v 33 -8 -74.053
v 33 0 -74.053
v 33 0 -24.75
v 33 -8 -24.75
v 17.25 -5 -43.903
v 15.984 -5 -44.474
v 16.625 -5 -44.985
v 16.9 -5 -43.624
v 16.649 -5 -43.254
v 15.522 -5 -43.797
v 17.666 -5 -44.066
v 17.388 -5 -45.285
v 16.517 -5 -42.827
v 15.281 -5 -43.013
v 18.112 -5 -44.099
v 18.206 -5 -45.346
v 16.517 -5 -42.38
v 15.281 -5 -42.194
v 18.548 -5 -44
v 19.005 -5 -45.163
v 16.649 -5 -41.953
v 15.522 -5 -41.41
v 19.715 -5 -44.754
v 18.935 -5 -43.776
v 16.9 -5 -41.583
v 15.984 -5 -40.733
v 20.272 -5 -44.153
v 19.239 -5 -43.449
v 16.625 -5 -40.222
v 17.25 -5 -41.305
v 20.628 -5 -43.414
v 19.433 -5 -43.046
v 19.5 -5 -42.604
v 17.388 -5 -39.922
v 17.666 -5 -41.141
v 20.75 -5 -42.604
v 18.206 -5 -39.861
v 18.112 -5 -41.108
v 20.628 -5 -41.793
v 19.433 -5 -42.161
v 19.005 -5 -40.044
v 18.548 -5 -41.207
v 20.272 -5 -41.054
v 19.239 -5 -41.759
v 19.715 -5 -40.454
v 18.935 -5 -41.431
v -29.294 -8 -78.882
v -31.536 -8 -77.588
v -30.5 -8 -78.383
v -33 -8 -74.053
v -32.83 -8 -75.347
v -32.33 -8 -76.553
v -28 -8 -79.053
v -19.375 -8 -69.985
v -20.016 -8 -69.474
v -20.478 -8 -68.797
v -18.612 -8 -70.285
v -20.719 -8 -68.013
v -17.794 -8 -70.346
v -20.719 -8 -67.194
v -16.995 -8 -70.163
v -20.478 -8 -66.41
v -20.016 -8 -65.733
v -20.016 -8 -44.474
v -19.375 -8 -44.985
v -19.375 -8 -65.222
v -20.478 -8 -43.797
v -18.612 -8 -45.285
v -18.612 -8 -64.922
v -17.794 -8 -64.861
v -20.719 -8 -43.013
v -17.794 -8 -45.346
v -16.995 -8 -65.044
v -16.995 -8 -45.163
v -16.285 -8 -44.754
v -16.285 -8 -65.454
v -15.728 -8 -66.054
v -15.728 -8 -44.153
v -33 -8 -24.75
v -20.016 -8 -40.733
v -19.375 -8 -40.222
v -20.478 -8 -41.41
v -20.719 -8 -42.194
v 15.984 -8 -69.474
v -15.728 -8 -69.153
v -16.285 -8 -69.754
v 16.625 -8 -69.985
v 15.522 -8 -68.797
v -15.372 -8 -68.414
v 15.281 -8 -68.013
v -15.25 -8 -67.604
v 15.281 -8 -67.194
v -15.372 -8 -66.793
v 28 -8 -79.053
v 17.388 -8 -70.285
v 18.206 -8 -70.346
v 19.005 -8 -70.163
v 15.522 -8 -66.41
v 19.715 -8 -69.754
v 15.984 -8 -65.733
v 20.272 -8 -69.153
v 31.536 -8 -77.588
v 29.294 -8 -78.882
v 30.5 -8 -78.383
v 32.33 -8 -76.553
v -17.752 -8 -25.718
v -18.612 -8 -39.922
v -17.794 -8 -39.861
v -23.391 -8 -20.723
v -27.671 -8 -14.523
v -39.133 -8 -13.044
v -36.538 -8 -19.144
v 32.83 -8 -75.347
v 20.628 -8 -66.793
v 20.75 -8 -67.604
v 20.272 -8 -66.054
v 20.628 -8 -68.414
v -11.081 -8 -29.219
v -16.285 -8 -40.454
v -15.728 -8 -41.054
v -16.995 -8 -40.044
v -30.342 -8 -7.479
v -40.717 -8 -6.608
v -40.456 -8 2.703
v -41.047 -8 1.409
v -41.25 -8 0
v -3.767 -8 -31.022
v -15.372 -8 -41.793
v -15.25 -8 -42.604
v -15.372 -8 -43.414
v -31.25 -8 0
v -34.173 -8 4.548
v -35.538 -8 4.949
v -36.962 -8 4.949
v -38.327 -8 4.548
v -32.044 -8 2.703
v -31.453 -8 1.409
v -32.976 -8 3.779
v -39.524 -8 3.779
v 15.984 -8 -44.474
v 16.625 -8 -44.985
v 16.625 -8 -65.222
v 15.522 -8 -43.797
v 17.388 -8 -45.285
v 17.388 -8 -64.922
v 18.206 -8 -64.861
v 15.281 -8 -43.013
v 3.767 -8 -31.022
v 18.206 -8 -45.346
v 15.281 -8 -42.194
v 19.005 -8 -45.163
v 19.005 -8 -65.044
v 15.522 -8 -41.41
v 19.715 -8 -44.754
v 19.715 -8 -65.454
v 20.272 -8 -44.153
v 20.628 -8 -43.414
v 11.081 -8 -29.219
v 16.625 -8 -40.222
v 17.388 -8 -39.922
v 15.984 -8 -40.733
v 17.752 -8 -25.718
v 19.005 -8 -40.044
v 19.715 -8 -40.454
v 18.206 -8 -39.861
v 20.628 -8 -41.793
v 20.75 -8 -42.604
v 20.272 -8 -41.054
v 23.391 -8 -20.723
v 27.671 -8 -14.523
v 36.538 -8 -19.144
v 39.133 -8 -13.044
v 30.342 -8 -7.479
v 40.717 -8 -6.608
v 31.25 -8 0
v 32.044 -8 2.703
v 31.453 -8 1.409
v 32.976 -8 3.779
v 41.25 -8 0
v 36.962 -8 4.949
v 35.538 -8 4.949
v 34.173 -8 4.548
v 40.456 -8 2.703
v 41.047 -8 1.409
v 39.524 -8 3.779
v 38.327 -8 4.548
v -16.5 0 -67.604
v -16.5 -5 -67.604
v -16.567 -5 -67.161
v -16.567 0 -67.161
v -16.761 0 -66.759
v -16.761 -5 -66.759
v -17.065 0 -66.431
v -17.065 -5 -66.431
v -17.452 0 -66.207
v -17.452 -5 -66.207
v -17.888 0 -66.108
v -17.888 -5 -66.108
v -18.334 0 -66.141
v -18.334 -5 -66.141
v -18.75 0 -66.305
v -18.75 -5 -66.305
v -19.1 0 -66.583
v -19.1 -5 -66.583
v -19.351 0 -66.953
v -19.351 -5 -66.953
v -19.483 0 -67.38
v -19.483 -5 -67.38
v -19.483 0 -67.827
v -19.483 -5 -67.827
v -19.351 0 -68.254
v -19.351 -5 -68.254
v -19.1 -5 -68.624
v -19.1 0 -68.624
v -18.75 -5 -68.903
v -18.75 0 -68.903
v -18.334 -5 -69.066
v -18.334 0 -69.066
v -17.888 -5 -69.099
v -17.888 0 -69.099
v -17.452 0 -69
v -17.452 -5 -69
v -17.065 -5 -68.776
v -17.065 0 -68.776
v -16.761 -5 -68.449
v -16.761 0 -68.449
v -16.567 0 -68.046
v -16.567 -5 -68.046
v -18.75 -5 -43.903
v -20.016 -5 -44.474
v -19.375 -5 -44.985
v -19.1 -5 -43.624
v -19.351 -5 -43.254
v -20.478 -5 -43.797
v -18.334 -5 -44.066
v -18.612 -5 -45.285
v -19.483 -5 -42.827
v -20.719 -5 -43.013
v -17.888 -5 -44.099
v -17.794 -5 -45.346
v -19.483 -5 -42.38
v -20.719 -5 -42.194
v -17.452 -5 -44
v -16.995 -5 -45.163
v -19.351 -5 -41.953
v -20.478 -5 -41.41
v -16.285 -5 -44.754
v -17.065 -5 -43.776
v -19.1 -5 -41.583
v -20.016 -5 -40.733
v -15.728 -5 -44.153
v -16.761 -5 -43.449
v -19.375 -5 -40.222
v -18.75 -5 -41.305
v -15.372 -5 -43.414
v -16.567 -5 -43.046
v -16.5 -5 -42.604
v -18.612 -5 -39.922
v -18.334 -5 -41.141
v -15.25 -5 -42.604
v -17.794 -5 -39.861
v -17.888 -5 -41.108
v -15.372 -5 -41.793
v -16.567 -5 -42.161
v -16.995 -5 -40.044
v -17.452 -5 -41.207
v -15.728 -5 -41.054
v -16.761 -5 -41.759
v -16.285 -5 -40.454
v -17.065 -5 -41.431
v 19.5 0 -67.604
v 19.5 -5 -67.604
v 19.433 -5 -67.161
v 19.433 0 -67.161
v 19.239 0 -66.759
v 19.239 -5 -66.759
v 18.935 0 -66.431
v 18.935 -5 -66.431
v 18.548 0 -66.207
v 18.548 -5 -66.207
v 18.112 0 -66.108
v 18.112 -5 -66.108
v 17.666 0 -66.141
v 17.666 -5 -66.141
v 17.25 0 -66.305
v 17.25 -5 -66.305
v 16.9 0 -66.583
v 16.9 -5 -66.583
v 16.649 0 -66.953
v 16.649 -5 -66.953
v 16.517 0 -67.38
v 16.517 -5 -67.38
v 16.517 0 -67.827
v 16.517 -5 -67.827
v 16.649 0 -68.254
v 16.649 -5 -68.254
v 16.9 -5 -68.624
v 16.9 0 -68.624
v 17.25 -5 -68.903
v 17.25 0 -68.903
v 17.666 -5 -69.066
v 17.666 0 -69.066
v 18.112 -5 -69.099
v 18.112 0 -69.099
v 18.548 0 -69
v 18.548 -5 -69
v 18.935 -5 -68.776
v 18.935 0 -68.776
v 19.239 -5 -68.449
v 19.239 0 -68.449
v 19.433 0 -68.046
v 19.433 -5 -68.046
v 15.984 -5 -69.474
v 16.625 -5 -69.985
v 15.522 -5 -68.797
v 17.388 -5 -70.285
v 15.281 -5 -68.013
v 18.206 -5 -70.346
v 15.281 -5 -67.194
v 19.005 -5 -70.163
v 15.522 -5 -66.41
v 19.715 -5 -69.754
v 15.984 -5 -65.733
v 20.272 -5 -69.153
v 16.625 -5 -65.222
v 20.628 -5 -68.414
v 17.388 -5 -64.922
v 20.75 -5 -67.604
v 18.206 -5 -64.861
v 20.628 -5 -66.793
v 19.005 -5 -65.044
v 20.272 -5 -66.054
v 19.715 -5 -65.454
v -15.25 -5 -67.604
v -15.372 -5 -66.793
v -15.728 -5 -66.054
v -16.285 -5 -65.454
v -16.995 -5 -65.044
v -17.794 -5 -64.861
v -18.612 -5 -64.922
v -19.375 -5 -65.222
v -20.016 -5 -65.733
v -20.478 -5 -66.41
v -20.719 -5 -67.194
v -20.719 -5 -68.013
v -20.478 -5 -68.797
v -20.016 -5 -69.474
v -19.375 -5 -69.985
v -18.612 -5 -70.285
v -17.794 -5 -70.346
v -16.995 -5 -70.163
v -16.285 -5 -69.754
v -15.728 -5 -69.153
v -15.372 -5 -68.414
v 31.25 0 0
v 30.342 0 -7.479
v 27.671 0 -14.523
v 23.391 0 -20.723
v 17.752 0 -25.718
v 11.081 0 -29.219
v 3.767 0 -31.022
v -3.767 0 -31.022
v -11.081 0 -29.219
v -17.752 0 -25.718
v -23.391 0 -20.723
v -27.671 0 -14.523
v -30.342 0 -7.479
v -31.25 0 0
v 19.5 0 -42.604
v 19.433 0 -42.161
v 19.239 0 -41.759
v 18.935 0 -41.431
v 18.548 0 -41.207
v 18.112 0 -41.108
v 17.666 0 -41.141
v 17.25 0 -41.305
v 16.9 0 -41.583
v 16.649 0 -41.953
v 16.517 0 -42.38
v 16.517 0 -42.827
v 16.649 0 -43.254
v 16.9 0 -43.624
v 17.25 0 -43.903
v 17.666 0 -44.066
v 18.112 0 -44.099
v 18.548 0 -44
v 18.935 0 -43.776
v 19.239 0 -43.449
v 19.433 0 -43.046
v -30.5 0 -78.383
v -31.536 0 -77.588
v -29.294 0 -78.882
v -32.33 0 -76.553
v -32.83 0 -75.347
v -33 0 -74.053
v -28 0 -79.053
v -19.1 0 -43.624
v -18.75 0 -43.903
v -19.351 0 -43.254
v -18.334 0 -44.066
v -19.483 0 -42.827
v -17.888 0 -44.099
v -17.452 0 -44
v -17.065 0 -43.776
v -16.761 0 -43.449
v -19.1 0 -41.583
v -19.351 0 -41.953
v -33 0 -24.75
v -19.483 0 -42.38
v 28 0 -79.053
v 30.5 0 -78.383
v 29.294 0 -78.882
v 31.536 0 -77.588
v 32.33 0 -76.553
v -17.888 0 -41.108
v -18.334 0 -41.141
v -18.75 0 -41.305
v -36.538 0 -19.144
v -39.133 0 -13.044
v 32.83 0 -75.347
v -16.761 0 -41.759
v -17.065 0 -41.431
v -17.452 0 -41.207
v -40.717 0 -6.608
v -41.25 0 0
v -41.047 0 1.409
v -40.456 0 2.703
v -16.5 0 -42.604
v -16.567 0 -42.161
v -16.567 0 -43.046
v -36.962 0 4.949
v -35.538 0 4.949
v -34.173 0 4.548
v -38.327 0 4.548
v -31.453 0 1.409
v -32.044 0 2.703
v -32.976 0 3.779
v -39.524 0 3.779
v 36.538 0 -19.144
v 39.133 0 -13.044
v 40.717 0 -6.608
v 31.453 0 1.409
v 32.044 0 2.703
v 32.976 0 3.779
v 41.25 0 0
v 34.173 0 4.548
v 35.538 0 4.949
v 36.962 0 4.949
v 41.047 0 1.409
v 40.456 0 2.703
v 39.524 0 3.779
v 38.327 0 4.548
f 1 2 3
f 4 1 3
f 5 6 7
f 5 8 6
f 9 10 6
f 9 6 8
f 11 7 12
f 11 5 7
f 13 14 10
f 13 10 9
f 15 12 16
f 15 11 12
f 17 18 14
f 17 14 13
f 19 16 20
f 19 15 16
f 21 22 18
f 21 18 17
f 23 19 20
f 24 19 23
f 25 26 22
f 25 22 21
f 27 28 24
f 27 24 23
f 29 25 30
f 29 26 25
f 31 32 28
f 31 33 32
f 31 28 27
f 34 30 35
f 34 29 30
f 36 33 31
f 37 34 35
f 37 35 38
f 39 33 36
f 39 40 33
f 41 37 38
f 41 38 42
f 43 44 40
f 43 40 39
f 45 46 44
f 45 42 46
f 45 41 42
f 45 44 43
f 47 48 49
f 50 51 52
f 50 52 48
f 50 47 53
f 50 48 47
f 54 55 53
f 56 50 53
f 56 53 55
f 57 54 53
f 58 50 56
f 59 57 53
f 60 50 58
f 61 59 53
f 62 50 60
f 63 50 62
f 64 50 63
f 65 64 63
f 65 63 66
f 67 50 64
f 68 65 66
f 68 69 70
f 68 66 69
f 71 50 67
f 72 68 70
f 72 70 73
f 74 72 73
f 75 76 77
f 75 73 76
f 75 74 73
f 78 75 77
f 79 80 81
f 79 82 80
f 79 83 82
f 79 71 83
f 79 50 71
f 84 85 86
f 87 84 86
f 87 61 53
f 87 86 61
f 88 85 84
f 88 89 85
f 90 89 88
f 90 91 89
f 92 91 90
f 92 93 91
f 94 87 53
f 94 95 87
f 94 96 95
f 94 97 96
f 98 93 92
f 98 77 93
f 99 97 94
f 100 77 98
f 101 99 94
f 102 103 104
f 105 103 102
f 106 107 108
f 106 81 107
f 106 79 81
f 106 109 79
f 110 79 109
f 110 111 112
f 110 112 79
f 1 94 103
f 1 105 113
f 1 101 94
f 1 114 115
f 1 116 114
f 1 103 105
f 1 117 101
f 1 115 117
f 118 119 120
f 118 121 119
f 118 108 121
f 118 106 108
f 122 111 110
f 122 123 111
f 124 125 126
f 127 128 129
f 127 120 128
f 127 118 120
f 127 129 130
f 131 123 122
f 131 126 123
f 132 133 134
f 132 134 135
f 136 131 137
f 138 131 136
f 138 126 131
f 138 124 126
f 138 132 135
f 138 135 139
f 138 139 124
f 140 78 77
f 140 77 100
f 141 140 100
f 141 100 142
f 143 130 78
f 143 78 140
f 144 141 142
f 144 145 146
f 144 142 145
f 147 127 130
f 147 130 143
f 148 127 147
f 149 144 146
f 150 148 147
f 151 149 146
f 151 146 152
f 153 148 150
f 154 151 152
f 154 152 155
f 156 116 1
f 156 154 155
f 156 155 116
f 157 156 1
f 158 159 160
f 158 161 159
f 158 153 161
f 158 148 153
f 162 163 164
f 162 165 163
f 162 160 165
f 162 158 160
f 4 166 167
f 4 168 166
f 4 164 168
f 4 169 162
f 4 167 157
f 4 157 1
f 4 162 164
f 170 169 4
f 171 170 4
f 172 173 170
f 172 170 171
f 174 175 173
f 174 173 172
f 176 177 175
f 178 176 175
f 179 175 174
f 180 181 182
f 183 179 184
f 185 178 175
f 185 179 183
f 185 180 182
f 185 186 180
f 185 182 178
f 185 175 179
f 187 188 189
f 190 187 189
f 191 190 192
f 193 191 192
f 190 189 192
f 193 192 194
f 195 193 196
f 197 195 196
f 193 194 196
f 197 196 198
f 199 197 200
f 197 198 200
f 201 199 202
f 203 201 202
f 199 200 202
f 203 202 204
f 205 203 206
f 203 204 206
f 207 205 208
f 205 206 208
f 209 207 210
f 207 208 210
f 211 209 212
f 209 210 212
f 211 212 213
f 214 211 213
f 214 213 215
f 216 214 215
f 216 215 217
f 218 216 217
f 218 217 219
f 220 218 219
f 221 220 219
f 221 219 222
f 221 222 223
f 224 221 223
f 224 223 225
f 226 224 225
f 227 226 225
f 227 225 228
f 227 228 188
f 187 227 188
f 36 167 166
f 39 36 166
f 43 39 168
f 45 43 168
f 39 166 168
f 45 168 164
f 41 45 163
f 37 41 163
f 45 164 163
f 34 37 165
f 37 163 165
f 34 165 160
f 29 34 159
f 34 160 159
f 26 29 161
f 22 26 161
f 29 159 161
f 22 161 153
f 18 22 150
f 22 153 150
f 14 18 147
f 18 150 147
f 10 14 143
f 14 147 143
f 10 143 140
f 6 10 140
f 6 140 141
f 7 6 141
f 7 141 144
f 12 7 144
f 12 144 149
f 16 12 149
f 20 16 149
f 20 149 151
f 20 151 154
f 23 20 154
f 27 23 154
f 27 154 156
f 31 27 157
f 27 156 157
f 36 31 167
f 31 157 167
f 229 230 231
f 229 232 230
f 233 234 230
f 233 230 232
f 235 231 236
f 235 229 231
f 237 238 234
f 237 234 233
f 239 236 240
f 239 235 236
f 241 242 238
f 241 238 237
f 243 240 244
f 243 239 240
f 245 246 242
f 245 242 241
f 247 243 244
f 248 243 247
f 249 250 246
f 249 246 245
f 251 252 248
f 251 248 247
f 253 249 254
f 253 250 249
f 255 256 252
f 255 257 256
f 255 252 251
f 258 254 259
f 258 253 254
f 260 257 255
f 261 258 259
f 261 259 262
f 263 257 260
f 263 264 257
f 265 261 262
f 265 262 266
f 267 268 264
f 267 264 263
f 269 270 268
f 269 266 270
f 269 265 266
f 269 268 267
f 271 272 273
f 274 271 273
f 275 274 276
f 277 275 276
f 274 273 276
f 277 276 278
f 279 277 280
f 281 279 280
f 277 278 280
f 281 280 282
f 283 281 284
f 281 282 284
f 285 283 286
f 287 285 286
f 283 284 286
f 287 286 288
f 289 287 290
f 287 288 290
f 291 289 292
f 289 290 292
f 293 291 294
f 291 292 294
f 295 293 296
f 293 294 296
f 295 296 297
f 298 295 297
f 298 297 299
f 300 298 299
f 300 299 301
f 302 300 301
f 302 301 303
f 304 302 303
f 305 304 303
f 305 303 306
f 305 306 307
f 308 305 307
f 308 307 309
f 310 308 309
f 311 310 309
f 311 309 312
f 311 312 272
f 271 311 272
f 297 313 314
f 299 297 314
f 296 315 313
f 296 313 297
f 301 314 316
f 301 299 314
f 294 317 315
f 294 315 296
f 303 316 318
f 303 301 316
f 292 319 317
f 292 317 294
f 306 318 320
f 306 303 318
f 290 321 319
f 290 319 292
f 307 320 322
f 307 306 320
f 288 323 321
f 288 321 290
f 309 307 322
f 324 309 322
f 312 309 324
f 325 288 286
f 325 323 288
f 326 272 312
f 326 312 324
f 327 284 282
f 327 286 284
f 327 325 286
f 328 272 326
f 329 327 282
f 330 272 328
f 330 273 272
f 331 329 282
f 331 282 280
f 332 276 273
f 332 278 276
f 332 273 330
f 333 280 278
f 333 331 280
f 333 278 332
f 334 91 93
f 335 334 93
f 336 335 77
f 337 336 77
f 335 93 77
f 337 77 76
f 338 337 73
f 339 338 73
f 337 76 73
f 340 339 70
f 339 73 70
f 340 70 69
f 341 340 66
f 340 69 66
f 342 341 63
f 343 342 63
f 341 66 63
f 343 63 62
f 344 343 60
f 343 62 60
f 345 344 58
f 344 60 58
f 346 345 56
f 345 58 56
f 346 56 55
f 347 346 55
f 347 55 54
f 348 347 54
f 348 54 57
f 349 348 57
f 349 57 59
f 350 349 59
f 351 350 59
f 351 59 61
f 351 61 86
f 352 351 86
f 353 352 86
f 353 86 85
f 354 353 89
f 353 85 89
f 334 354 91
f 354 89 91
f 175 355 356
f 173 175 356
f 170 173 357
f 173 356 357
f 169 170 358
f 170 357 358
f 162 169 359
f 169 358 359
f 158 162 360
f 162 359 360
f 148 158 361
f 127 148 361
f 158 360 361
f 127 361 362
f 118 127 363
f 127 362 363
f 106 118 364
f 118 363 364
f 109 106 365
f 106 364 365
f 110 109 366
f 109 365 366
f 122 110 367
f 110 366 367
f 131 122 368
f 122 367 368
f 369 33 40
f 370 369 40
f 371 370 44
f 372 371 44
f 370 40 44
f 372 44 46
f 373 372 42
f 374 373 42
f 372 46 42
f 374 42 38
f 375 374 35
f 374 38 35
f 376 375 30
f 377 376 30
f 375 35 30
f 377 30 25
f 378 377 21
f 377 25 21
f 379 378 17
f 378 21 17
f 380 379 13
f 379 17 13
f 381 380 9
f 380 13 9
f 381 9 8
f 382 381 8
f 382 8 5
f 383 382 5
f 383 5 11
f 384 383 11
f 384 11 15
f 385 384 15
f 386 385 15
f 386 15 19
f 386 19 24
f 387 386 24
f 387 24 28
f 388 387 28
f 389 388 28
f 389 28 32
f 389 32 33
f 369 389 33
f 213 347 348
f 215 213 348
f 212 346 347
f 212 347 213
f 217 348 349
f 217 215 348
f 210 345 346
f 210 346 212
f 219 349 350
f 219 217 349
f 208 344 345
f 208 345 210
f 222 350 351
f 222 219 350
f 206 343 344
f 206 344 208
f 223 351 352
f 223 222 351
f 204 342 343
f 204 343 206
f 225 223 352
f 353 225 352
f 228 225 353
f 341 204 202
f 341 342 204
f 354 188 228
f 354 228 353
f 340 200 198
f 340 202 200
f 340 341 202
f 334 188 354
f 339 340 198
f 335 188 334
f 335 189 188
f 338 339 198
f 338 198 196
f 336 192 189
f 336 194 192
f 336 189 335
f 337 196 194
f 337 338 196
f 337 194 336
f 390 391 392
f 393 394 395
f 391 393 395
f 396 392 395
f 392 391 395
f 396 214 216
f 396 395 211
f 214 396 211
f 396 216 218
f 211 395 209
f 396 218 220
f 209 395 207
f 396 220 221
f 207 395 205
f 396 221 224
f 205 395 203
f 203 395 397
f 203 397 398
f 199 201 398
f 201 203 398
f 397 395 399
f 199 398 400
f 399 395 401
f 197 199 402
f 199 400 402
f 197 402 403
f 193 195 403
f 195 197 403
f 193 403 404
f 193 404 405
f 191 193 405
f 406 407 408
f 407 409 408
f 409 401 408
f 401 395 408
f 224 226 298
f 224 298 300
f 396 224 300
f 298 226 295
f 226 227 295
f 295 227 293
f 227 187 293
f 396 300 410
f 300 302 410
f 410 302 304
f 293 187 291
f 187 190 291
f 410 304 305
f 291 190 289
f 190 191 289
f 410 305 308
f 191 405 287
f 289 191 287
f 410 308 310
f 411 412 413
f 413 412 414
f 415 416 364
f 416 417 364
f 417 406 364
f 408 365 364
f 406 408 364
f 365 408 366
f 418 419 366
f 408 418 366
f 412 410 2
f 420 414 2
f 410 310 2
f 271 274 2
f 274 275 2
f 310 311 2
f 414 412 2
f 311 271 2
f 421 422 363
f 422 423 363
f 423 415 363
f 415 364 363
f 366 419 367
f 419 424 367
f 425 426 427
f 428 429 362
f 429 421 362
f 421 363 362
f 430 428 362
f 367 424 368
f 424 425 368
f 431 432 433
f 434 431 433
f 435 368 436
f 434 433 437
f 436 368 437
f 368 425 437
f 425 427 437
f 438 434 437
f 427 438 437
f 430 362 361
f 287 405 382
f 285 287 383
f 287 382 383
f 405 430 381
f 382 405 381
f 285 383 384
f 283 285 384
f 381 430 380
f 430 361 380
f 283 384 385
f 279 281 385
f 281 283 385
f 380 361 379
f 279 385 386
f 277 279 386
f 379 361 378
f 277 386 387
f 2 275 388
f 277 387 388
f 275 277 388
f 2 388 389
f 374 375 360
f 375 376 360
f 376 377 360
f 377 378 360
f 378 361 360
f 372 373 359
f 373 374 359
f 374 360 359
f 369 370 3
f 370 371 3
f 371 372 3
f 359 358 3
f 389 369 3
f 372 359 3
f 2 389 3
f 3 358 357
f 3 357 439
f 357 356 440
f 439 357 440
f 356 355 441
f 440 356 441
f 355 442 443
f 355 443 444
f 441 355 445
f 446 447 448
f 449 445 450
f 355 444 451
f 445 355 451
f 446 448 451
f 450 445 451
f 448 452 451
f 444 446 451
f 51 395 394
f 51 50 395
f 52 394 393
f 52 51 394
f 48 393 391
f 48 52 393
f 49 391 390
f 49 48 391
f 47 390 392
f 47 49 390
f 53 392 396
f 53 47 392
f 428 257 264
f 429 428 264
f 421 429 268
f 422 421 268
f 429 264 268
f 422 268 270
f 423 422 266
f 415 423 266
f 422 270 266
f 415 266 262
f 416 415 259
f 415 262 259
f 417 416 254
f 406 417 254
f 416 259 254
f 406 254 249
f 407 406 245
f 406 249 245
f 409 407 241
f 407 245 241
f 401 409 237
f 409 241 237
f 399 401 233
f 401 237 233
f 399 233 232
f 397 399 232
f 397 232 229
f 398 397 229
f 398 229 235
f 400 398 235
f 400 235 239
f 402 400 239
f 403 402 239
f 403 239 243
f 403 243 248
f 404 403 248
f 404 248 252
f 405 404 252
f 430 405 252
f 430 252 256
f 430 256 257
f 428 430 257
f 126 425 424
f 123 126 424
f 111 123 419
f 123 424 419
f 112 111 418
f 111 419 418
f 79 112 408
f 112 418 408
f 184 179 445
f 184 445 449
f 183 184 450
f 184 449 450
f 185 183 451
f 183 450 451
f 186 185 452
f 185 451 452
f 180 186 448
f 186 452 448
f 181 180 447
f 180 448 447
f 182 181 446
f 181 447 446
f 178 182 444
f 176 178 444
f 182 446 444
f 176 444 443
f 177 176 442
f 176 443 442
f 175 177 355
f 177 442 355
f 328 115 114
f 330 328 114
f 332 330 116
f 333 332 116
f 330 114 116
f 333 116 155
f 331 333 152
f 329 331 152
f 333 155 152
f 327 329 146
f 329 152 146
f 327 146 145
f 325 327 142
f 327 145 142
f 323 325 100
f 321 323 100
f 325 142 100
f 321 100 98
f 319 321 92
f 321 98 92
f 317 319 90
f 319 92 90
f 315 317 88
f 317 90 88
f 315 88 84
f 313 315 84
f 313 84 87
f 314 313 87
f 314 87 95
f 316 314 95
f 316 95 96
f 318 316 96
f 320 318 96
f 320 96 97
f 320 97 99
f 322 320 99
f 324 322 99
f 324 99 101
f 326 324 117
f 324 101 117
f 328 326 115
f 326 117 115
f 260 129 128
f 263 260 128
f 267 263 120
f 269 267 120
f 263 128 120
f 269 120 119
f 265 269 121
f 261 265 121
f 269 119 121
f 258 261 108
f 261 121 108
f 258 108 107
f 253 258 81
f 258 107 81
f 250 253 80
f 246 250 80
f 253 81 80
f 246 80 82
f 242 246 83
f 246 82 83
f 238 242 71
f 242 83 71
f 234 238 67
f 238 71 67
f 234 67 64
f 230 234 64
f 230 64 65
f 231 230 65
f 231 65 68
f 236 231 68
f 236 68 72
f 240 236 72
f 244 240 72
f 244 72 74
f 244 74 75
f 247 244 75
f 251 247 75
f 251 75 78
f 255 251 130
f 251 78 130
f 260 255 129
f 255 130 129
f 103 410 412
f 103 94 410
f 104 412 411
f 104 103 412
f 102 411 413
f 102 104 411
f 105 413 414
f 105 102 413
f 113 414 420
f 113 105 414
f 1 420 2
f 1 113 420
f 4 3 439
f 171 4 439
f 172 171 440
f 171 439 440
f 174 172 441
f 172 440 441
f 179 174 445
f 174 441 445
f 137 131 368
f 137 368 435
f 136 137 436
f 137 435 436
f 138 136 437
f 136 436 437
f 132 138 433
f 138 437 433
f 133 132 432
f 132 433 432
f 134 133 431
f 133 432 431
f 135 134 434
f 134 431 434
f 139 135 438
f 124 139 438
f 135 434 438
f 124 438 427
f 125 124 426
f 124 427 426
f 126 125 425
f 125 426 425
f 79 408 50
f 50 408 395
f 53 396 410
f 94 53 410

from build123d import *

# Parameters (mm, degrees)
F1_DEPTH = 8
F2_R     = 1.5
F3_DEPTH = 25
F4_R     = 2.75
F5_DEPTH = 3
F6_R     = 5


with BuildPart() as f1:
    # F0 (on Front) → F1 (new body)
    with BuildSketch(Plane.XZ):
        with BuildLine():
            Line((-33, -24.75), (-33, -79.052559))
            Line((-33, -79.052559), (33, -79.052559))
            Line((33, -79.052559), (33, -24.75))
            ThreePointArc((33, -24.75), (39.133186, -13.044395), (41.25, 0))
            ThreePointArc((41.25, 0), (36.25, 5), (31.25, 0))
            ThreePointArc((31.25, 0), (0, -31.25), (-31.25, 0))
            ThreePointArc((-31.25, 0), (-36.25, 5), (-41.25, 0))
            ThreePointArc((-41.25, 0), (-39.133186, -13.044395), (-33, -24.75))
        make_face()
    extrude(amount=F1_DEPTH)

    # F2 (on face) → F3 (cut)
    with BuildSketch(Plane.XZ.offset(8)):
        with Locations((18, -42.60355)):
            Circle(F2_R)
        with Locations((-18, -42.60355)):
            Circle(F2_R)
        with Locations((-18, -67.60355)):
            Circle(F2_R)
        with Locations((18, -67.60355)):
            Circle(F2_R)
    extrude(amount=-F3_DEPTH, mode=Mode.SUBTRACT)

    # F4 (on face) → F5 (cut)
    with BuildSketch(Plane.XZ.offset(8)):
        with Locations((-18, -42.60355)):
            Circle(F4_R)
        with Locations((18, -42.60355)):
            Circle(F4_R)
        with Locations((18, -67.60355)):
            Circle(F4_R)
        with Locations((-18, -67.60355)):
            Circle(F4_R)
    extrude(amount=-F5_DEPTH, mode=Mode.SUBTRACT)

    # F6
    f6_edges = [f1.edges().sort_by_distance(p)[0] for p in [
        (33, -4, -79.052559),
        (-33, -4, -79.052559),
    ]]
    fillet(f6_edges, radius=F6_R)


solid = f1.part
